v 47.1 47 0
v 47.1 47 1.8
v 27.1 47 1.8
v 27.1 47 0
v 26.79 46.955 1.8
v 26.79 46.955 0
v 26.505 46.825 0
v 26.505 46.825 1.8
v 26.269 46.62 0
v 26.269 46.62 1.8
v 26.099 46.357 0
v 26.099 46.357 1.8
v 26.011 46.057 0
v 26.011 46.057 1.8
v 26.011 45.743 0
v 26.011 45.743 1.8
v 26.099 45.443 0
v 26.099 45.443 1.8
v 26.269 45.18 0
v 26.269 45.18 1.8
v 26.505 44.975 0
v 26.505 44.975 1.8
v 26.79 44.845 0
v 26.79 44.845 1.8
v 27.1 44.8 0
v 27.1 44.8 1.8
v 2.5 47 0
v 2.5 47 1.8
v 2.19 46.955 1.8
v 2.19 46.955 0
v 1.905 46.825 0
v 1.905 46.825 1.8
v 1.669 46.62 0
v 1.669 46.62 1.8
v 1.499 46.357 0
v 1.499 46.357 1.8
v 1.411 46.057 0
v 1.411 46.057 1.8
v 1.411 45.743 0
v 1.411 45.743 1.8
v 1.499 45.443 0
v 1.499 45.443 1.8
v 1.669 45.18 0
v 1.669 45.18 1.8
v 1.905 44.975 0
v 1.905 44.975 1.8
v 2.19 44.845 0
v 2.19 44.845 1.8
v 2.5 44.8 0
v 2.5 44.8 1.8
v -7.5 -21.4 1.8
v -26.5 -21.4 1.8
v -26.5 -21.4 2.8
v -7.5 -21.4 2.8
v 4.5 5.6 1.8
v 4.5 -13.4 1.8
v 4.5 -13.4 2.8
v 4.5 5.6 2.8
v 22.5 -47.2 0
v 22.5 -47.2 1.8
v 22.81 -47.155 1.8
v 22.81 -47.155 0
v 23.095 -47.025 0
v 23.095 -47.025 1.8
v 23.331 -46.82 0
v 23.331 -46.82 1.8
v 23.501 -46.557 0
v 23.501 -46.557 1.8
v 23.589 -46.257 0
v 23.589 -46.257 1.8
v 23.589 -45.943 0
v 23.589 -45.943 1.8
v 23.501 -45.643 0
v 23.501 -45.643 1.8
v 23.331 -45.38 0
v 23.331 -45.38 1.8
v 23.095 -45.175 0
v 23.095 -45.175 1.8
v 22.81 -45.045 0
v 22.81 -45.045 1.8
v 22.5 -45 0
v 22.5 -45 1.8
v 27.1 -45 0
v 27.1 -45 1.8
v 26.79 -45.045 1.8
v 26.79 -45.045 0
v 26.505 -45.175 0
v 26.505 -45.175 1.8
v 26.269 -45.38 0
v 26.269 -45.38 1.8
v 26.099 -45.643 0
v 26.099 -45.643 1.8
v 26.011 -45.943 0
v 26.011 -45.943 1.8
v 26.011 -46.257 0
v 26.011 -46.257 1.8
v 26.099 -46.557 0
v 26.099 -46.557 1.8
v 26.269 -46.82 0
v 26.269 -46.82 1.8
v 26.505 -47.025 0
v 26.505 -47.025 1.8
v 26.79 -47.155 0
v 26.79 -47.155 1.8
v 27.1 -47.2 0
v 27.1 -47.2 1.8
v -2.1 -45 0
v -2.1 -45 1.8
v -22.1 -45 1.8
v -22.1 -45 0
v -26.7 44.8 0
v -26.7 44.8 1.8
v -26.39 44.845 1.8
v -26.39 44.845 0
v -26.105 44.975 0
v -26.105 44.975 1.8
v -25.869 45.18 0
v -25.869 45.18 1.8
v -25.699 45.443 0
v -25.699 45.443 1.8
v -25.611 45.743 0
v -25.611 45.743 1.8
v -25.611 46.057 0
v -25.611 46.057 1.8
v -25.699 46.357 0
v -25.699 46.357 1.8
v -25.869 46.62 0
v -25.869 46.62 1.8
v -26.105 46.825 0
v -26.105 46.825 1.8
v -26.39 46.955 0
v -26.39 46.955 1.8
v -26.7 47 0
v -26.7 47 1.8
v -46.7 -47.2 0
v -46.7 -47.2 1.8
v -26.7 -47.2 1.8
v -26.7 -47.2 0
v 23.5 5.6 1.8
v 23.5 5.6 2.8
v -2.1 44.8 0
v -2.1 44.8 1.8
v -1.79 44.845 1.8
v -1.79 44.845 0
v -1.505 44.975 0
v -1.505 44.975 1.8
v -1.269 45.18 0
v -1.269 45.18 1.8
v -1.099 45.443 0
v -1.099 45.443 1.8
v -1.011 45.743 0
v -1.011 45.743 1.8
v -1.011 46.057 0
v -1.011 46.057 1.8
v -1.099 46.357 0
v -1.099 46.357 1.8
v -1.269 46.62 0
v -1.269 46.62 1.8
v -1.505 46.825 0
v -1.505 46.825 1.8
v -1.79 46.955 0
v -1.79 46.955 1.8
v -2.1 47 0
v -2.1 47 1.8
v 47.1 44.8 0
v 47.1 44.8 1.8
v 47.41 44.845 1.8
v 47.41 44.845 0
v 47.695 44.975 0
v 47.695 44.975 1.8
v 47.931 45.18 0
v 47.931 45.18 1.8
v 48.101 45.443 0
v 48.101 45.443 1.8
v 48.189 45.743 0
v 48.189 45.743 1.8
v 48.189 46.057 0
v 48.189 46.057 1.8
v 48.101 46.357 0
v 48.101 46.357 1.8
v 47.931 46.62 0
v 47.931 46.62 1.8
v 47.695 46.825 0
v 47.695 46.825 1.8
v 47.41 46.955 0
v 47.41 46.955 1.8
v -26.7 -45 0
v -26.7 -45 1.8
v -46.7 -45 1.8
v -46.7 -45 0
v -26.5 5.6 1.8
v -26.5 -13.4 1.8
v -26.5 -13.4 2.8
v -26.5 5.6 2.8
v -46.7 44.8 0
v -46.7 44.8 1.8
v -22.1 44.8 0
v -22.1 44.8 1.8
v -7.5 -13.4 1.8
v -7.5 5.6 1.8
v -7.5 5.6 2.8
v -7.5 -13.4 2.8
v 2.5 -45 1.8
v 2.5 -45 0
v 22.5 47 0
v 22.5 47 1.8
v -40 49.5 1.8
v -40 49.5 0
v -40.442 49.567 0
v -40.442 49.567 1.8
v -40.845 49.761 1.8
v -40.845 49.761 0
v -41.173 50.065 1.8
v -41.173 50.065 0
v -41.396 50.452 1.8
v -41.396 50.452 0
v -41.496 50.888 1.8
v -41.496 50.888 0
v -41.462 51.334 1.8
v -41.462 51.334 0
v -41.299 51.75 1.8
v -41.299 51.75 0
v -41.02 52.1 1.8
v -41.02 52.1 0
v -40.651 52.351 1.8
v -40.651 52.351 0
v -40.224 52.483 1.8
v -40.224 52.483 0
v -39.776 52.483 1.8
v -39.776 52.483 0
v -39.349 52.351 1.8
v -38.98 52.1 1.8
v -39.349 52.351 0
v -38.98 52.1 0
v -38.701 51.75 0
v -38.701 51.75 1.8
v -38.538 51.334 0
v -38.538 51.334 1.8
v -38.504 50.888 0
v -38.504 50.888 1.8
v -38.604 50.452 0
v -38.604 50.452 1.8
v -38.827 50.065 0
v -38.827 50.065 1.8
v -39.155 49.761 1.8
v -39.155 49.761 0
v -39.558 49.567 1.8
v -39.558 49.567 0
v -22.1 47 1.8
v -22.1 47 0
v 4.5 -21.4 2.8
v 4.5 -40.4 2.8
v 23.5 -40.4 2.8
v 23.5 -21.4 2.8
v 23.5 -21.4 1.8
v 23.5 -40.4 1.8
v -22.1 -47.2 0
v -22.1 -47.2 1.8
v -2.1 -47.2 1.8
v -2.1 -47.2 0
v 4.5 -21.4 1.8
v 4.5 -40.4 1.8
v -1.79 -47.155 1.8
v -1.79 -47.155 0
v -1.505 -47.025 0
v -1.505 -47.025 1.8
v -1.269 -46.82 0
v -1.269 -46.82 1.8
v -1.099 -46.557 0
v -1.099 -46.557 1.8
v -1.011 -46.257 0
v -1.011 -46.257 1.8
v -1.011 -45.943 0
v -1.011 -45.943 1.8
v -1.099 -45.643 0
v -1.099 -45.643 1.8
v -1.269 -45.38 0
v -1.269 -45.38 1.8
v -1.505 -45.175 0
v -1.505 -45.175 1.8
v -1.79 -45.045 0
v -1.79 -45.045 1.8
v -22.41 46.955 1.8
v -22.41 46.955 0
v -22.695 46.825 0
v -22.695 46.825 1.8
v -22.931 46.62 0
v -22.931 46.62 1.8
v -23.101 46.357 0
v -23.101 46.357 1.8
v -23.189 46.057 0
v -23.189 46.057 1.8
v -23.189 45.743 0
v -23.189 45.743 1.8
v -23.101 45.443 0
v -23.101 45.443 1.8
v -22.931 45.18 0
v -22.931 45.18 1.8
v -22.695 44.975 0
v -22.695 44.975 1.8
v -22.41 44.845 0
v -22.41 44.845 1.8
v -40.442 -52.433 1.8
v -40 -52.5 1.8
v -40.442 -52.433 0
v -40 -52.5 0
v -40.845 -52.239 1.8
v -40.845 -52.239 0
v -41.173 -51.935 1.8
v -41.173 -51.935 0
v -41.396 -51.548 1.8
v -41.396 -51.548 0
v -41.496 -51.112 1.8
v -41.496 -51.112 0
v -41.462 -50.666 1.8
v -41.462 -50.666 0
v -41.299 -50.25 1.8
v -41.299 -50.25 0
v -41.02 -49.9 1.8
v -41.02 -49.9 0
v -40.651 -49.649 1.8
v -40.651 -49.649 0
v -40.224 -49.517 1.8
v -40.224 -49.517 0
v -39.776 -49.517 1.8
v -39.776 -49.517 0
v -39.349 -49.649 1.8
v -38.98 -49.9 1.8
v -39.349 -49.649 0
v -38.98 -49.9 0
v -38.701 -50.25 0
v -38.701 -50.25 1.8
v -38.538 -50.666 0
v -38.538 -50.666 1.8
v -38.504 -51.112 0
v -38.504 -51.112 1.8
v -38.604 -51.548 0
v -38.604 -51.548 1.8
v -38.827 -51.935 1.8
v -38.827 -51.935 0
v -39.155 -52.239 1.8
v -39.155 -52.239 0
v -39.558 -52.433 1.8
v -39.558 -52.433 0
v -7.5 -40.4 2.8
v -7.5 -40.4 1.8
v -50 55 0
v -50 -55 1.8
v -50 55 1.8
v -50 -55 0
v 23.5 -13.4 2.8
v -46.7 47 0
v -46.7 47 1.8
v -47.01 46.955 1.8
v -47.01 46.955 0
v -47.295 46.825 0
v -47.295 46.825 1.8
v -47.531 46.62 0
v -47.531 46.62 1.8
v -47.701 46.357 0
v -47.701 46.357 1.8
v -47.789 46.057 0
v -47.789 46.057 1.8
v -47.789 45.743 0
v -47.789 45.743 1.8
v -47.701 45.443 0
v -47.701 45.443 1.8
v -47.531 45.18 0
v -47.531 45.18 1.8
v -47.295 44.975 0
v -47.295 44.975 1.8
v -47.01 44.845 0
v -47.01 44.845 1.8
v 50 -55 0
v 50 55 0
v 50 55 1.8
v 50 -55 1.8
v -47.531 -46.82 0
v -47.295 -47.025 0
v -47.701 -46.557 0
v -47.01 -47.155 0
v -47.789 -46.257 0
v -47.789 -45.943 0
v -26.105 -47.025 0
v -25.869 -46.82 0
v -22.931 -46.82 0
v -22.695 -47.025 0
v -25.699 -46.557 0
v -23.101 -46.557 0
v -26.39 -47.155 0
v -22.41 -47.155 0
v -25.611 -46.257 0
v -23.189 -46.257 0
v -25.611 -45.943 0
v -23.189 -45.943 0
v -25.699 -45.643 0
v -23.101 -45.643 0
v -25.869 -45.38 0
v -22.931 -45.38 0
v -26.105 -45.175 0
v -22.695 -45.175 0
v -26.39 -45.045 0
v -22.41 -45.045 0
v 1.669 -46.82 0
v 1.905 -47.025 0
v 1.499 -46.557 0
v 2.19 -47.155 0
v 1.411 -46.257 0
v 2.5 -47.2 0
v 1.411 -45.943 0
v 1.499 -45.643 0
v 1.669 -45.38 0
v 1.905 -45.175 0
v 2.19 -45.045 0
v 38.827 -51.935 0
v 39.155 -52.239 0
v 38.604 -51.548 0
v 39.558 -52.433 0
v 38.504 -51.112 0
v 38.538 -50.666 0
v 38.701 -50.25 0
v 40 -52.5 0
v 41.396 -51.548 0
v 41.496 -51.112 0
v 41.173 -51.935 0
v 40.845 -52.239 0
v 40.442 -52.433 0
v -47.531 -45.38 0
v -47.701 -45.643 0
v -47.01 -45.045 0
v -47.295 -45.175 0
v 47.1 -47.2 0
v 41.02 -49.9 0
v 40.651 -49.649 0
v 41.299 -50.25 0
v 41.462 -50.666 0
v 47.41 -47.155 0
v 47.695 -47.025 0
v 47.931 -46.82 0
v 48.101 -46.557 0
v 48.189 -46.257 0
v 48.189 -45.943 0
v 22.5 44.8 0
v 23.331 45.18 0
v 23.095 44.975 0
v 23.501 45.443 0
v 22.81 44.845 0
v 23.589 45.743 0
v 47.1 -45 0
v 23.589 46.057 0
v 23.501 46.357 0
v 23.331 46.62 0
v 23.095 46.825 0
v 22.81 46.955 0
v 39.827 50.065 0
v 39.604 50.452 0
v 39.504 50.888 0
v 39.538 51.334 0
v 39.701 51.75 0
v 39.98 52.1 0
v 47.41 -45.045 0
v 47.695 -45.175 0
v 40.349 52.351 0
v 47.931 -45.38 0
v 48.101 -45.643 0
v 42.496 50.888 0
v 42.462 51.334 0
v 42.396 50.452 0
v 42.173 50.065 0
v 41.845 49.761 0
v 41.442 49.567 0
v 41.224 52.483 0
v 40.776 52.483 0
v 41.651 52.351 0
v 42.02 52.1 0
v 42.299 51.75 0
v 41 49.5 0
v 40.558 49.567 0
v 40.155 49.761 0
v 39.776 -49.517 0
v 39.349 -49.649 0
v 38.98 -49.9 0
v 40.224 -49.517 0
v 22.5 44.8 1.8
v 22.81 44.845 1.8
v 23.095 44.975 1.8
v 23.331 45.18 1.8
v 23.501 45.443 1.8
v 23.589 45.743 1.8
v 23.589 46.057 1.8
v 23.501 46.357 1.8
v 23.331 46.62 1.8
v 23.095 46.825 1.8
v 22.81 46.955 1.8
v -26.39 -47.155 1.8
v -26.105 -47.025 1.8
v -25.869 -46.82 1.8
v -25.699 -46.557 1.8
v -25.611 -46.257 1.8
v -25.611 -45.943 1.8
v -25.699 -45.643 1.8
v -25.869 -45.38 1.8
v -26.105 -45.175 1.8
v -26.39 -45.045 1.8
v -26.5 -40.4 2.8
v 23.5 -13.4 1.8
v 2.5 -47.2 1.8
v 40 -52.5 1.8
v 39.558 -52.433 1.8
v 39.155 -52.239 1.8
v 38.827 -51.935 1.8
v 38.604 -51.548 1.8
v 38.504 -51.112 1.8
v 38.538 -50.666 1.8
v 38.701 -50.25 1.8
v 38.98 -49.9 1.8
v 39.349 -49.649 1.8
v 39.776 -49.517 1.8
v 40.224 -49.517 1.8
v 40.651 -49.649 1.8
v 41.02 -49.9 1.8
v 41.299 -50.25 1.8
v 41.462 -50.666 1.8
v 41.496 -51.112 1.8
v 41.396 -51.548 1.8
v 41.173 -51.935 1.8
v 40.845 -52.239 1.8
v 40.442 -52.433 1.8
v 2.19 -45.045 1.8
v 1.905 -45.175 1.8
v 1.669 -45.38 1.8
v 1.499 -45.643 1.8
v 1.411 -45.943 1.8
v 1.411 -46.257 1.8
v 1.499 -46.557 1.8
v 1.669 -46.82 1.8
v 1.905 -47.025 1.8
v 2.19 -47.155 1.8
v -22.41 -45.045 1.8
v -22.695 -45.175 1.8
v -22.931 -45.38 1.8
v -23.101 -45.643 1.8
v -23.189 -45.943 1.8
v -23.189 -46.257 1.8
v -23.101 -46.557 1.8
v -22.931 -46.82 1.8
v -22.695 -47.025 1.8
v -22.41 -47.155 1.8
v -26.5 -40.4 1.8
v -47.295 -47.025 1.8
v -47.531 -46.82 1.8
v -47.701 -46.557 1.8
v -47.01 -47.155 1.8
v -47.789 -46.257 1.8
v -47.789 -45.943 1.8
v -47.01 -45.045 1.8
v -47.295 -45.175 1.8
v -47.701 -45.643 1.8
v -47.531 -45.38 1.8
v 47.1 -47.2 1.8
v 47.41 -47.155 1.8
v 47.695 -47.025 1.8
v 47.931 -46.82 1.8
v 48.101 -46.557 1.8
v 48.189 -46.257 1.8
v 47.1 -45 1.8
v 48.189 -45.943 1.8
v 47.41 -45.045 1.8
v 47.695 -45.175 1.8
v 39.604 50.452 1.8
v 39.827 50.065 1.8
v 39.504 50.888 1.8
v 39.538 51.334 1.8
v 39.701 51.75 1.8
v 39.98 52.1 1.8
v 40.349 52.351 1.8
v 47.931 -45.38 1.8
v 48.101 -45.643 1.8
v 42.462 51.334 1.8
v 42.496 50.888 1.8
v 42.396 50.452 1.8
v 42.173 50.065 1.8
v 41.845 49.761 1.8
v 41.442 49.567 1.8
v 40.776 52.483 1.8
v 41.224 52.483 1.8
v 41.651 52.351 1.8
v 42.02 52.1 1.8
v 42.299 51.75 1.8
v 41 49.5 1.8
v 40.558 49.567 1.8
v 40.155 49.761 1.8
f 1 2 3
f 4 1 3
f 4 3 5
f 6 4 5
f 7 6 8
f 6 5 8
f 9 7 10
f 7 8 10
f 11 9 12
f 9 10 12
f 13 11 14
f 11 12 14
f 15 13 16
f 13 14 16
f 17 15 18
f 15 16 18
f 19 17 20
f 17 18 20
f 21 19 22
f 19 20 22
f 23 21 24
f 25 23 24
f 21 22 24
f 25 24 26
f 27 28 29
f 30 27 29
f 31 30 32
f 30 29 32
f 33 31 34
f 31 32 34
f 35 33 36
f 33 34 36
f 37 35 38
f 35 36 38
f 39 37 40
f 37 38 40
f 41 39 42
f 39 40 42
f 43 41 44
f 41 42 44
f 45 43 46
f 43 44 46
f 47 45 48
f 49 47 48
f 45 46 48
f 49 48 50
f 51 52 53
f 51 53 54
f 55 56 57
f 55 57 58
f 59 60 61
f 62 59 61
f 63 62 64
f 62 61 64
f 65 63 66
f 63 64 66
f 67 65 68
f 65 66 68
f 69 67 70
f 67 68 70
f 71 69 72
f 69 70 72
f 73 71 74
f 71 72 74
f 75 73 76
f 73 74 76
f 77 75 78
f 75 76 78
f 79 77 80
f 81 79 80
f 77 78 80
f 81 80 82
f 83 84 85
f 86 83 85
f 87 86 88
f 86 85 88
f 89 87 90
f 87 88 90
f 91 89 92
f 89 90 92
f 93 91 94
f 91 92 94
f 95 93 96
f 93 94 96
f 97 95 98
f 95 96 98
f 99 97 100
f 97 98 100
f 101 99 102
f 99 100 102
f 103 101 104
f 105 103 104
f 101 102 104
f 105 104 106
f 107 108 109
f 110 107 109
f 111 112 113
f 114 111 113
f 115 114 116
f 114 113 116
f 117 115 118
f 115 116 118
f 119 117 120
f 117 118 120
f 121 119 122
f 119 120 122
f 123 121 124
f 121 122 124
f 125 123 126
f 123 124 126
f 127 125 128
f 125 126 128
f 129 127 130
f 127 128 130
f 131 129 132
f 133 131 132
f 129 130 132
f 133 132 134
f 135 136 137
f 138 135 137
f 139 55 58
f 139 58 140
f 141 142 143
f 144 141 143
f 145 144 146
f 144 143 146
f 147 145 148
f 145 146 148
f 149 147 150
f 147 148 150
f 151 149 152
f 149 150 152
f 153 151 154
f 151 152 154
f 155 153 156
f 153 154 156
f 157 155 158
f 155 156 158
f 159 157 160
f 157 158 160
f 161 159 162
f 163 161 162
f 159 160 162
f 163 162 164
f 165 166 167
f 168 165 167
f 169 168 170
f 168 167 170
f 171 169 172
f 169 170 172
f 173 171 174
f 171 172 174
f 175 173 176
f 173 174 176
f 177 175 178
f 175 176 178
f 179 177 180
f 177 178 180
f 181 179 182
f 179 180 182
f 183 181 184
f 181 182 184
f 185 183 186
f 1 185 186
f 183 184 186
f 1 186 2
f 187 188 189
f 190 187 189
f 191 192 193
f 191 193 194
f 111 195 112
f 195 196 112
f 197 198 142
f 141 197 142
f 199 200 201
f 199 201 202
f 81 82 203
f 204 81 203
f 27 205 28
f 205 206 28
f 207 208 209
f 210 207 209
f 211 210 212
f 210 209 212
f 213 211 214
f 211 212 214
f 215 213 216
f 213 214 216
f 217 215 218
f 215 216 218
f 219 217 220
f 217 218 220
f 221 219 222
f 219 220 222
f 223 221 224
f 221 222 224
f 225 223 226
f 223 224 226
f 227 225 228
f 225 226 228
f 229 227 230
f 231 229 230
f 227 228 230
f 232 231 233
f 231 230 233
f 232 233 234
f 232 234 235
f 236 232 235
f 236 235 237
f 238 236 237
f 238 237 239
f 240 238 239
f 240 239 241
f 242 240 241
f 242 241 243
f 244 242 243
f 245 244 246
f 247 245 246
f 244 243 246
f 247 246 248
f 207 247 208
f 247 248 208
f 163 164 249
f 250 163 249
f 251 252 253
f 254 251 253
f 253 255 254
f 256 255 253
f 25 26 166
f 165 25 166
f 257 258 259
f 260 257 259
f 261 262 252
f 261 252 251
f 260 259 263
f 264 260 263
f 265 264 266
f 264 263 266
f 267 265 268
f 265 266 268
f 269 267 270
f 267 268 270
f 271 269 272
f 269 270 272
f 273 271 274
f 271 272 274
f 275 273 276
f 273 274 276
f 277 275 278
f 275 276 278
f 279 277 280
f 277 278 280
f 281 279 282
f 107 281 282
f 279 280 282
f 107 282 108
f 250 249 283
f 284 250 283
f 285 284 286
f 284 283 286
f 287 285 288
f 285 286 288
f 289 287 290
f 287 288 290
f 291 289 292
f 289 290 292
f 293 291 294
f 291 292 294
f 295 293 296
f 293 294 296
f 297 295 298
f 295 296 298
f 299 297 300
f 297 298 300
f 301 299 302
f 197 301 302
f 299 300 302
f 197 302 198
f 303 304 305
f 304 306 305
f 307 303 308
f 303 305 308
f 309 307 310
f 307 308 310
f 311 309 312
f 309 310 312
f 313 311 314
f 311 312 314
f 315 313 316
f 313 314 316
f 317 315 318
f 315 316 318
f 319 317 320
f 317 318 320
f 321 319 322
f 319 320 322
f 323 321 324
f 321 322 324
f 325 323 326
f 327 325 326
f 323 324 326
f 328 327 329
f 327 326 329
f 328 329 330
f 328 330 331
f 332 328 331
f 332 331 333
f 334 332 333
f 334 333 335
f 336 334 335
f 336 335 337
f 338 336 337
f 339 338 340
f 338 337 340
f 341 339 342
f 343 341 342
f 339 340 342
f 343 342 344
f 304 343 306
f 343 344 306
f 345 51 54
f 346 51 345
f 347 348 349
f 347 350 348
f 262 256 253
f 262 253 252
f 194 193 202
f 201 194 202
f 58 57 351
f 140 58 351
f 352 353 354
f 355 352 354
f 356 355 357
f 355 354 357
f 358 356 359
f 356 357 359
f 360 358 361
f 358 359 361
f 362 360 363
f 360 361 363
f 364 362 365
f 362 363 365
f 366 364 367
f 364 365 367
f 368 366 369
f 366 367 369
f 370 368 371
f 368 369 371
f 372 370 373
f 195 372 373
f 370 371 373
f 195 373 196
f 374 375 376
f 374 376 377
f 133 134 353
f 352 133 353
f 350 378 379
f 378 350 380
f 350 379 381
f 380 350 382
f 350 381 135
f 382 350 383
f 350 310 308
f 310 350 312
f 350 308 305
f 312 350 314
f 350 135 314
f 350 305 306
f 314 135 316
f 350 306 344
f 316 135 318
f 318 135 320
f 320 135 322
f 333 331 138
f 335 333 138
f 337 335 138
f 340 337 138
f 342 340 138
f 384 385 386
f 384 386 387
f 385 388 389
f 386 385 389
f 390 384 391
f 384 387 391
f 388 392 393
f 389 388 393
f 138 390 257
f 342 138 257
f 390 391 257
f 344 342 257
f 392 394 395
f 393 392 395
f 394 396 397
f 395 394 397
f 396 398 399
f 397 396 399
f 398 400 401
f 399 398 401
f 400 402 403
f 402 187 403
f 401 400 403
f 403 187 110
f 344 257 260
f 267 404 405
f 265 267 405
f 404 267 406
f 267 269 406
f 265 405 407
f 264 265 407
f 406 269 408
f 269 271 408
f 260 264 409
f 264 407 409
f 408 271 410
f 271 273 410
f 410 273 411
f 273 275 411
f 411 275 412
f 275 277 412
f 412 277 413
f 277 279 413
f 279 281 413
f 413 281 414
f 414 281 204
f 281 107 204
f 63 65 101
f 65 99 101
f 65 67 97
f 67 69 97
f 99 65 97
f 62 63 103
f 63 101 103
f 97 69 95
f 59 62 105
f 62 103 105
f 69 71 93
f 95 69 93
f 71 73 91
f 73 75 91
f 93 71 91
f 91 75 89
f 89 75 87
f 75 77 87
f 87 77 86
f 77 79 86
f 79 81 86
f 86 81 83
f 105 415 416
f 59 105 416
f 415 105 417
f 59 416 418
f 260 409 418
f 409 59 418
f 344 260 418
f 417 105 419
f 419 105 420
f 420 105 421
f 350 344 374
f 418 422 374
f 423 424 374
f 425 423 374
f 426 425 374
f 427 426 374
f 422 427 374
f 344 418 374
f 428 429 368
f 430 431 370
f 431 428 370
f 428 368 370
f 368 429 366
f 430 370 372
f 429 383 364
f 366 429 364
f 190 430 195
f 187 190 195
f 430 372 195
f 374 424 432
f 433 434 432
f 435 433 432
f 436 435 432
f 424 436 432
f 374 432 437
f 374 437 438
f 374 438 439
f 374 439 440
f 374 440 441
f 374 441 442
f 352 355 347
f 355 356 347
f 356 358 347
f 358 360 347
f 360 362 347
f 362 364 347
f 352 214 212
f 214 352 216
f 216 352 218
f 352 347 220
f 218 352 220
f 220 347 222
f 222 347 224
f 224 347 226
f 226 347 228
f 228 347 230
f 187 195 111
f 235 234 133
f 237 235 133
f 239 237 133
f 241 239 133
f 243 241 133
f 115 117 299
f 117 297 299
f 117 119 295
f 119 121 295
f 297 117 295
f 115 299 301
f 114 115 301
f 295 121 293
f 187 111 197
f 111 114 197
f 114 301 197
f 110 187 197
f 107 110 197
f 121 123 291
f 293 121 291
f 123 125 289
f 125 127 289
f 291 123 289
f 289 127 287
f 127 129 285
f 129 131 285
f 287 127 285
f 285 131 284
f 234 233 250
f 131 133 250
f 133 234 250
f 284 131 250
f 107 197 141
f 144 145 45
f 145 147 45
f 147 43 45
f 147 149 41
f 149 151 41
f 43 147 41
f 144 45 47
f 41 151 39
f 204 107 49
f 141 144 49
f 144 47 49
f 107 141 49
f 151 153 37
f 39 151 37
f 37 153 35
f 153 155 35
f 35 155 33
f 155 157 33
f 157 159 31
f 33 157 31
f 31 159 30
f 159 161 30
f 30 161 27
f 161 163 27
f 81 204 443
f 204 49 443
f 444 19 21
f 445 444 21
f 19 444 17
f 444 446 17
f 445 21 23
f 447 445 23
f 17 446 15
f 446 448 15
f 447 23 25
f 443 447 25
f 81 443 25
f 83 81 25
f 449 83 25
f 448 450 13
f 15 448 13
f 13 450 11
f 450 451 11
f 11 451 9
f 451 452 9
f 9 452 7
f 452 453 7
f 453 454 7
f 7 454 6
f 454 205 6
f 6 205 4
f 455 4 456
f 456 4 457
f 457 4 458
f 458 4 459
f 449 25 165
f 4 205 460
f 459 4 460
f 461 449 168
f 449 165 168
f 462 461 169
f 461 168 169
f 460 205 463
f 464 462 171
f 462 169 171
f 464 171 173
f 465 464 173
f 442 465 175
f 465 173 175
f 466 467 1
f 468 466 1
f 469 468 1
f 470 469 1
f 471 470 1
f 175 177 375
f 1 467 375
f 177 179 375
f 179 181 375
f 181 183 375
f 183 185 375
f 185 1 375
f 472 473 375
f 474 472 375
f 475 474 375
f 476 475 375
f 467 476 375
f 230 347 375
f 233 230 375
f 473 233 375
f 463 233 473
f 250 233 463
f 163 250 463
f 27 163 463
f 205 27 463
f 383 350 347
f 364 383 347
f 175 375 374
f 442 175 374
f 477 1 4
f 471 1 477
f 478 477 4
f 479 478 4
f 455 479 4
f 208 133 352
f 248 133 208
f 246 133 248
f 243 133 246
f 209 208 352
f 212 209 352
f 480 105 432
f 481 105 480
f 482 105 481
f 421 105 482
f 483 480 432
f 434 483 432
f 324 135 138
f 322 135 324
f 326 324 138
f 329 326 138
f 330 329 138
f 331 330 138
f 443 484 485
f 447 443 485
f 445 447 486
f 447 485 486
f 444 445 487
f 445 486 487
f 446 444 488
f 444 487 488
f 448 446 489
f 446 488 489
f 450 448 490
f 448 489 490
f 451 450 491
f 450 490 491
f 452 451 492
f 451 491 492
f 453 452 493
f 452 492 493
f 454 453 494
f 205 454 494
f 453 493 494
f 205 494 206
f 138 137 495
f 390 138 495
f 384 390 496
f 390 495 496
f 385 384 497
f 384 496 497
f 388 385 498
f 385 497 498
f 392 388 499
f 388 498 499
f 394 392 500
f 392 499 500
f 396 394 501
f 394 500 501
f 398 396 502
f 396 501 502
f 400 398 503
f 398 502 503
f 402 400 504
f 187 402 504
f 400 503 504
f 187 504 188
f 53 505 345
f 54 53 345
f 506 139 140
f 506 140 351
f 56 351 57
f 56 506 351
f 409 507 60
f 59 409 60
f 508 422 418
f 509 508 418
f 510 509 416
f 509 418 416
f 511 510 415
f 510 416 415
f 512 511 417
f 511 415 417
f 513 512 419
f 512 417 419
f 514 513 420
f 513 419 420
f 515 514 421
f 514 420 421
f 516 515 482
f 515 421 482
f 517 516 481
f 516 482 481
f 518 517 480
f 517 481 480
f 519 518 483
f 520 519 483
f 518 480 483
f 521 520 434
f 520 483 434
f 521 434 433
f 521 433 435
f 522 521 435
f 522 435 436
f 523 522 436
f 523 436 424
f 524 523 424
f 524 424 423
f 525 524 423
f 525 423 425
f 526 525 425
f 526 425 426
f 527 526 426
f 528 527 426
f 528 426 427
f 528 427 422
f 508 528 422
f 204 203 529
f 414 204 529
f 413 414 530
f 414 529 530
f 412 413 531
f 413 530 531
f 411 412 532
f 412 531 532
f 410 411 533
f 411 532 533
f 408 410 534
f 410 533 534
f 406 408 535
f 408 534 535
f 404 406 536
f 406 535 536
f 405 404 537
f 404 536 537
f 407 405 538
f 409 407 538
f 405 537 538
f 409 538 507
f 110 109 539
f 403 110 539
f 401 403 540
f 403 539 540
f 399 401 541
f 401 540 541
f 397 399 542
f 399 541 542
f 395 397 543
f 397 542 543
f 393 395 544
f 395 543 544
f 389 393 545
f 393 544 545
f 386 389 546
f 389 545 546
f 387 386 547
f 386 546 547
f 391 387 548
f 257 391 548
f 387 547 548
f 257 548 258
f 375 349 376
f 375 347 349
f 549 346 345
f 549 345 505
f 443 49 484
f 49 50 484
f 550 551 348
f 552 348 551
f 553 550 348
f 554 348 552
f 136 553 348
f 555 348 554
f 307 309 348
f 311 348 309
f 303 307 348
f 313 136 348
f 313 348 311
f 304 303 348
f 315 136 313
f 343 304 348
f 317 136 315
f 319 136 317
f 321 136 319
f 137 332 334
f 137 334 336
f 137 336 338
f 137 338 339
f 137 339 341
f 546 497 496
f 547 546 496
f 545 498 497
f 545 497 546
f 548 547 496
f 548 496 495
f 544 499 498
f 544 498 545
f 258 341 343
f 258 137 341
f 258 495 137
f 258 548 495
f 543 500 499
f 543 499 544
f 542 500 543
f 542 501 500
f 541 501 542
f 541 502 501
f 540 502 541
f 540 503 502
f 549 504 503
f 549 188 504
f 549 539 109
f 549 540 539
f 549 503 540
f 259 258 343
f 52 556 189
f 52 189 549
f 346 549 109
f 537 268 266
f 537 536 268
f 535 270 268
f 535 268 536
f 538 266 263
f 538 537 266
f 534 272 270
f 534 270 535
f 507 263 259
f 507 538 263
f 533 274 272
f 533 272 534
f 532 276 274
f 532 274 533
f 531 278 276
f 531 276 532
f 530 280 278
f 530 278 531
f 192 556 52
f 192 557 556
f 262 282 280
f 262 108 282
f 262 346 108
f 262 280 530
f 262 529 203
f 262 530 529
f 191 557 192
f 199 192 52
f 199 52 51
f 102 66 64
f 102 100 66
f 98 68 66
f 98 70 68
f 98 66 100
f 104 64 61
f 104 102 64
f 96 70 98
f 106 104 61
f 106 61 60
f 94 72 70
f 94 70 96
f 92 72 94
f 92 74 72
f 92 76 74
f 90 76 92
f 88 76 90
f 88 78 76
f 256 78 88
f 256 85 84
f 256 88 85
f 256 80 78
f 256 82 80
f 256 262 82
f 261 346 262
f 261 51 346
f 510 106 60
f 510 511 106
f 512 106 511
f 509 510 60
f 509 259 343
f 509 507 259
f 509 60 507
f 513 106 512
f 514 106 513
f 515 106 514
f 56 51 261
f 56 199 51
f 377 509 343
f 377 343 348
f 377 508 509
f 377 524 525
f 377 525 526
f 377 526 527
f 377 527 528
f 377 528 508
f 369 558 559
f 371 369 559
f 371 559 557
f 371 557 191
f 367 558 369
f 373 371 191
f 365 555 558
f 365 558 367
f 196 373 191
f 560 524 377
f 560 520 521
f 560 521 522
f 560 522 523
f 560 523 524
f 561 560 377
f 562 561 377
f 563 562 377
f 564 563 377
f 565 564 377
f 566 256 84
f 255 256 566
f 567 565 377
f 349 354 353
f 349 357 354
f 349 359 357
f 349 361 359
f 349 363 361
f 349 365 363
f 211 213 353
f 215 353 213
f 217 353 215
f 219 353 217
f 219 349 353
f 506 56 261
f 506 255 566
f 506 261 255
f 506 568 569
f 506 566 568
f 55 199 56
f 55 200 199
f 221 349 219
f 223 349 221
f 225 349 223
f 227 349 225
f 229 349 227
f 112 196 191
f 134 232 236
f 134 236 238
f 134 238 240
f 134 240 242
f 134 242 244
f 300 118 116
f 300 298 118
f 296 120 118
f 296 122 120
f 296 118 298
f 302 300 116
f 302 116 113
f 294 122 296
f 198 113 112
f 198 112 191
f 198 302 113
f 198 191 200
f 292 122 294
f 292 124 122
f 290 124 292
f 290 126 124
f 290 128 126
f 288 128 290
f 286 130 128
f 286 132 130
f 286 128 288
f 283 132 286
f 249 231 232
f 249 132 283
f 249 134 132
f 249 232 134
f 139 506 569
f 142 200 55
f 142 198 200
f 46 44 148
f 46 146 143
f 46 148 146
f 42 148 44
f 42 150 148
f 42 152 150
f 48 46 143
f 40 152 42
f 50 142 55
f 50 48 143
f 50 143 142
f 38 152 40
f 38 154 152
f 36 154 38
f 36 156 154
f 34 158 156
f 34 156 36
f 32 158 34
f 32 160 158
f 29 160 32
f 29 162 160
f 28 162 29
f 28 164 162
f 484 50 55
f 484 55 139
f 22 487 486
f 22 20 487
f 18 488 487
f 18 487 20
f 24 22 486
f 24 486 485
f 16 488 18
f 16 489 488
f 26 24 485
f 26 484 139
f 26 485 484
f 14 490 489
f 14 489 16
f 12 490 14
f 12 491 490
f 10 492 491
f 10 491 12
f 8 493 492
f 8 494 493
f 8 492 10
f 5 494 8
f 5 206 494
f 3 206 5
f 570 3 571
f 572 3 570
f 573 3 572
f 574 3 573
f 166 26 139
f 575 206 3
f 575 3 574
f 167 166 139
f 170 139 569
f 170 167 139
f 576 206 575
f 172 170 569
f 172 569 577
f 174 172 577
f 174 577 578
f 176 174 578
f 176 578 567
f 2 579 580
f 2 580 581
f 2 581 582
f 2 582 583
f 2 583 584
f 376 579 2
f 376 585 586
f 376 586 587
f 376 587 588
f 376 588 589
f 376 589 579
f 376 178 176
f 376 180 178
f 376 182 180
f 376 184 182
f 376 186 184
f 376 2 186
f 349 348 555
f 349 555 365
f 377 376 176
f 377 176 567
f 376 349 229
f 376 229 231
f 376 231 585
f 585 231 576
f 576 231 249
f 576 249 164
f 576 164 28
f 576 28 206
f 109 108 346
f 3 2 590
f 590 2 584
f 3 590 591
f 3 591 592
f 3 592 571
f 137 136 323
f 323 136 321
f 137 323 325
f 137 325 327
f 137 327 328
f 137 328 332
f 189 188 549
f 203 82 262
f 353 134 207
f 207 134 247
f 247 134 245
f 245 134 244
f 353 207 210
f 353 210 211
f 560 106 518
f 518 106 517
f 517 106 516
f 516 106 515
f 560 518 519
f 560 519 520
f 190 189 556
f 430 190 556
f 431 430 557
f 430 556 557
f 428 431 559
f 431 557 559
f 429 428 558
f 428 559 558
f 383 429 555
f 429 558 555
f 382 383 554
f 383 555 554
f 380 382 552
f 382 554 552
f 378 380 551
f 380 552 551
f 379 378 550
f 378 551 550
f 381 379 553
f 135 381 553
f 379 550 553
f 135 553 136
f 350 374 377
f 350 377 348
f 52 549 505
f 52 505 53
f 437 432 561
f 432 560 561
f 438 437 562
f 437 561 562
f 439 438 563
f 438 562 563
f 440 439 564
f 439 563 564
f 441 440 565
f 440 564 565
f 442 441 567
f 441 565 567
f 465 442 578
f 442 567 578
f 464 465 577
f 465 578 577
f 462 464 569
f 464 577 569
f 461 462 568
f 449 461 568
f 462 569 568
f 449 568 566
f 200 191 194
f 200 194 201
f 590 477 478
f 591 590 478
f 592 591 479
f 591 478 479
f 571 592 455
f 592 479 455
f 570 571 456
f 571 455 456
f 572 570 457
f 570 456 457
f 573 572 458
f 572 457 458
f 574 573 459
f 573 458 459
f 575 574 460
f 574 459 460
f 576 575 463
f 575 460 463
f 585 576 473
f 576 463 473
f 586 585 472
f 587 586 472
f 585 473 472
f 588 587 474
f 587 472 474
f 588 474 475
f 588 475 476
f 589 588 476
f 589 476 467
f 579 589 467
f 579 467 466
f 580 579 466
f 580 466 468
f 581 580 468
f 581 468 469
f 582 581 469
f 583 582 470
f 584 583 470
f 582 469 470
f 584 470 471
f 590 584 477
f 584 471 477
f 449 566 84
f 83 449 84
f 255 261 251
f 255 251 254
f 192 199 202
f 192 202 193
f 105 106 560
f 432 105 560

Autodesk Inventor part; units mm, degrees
ref_plane "YZ Plane" through (0, 0, 0) normal (1, 0, 0) x (0, 1, 0)
ref_plane "XZ Plane" through (0, 0, 0) normal (0, 1, 0) x (-1, 0, 0)
ref_plane "XY Plane" through (0, 0, 0) normal (0, 0, 1) x (1, 0, 0)
sketch "Sketch1" plane through (0, 0, 0) normal (0, 0, 1) x (1, 0, 0)
  line L0 (-50, 55) -> (50, 55)
  line L1 (50, 55) -> (50, -55)
  line L2 (50, -55) -> (-50, -55)
  line L3 (-50, -55) -> (-50, 55)
  line L4 (-50, 55) -> (50, -55) construction
  line L5 (50, 55) -> (-50, -55) construction
  point P0 (0, 0)
  dimension "d0" = 100
  dimension "d1" = 110
extrude "Extrusion1" add sketch "Sketch1" along normal blind 1.8
sketch "Sketch2" plane through (0, 0, 1.8) normal (0, 0, 1) x (1, 0, 0)
  line L0 (-26.5, -21.4) -> (-7.5, -21.4)
  line L1 (-7.5, -21.4) -> (-7.5, -40.4)
  line L2 (-7.5, -40.4) -> (-26.5, -40.4)
  line L3 (-26.5, -40.4) -> (-26.5, -21.4)
  line L4 (-26.5, -21.4) -> (-7.5, -40.4) construction
  line L5 (-7.5, -21.4) -> (-26.5, -40.4) construction
  line L6 (-50, -55) -> (50, -55) projected
  line L7 (-50, 55) -> (-50, -55) projected
  point P0 (0, 0)
  point P1 (-17, -30.9)
  dimension "d4" = 19
  dimension "d5" = 19
  dimension "d8" = 33.6
  dimension "d9" = 42.5
extrude "Extrusion2" add sketch "Sketch2" along normal blind 1
pattern_linear "Rectangular Pattern1" count 2 spacing 31 along (1, 0, 0) count 2 spacing 27 along (0, 1, 0) of "Extrusion2"
sketch "Sketch3" plane through (0, 0, 1.8) normal (0, 0, 1) x (1, 0, 0)
  line L0 (-46.7, -46.1) -> (-26.7, -46.1) construction
  line L1 (-46.7, -47.2) -> (-26.7, -47.2)
  line L2 (-26.7, -45) -> (-46.7, -45)
  arc A0 (-46.7, -45) -> (-46.7, -47.2) centre (-46.7, -46.1) ccw
  arc A1 (-26.7, -47.2) -> (-26.7, -45) centre (-26.7, -46.1) ccw
  line L3 (-50, 55) -> (-50, -55) projected
  line L4 (-50, -55) -> (50, -55) projected
  point P0 (0, 0)
  point P1 (-36.7, -46.1)
  dimension "d16" = 20
  dimension "d17" = 2.2
  dimension "d18" = 2.2
  dimension "d19" = 7.8
extrude "Extrusion3" cut sketch "Sketch3" against normal through all
pattern_linear "Rectangular Pattern2" count 4 spacing 24.6 along (1, 0, 0) count 2 spacing 92 along (0, 1, 0) of "Extrusion3"
sketch "Sketch4" plane through (0, 0, 1.8) normal (0, 0, 1) x (1, 0, 0)
  line L0 (50, -55) -> (50, 55) projected
  line L1 (50, 42.3) -> (-50.0933, 42.3) construction
  line L2 (47.1, 44.8) -> (27.1, 44.8) projected
  line L3 (50, -5.2) -> (-50.0933, -5.2) construction
  line L4 (35, 55) -> (35, -55) construction
  line L5 (36, 55) -> (36, -55) construction
  line L6 (-47, 55) -> (-47, -55) construction
  line L7 (-50, -55) -> (50, -55) construction
  line L8 (-50, 55) -> (-50, -55) construction
  line L9 (-50, 23) -> (-32.5921, 23) construction
  line L10 (50, 55) -> (-50, 55) construction
  line L11 (60.1599, 62.0026) -> (59.0568, -63.0375) construction
  line L12 (59.0568, -63.0375) -> (-57.4953, -62.0093) construction
  line L13 (-57.4953, -62.0093) -> (-56.3922, 63.0308) construction
  line L14 (-56.3922, 63.0308) -> (60.1599, 62.0026) construction
  point P0 (0, 0)
  dimension "d28" = 2.5
  dimension "d29" = 50
  dimension "d30" = 15
  dimension "d31" = 14
  dimension "d44" = 3
  dimension "d45" = 32
sketch "Sketch5" plane through (0, 0, 1.8) normal (0, 0, 1) x (1, 0, 0)
  line L0 (-50, 55) -> (-50, -55) projected
  line L1 (50, -55) -> (50, 55) projected
  line L2 (50, 55) -> (-50, 55) projected
  line L3 (-50, -55) -> (50, -55) projected
  point P0 (0, 0)
  point P1 (-40, 51)
  point P2 (41, 51)
  point P3 (-40, -51)
  point P4 (40, -51)
  dimension "d32" = 10
  dimension "d33" = 9
  dimension "d34" = 4
  dimension "d36" = 4
  dimension "d88" = 10
hole "Hole1" at (-40, 51, 1.8) at (-40, -51, 1.8) at (40, -51, 1.8) at (41, 51, 1.8) direction (0, 0, -1) diameter 3 end through all
sketch "Sketch7" plane through (0, 0, 1.8) normal (0, 0, 1) x (1, 0, 0)
  point P0 (0, 0)
equation "\"d36\" = d34"
properties part number "PCB"
